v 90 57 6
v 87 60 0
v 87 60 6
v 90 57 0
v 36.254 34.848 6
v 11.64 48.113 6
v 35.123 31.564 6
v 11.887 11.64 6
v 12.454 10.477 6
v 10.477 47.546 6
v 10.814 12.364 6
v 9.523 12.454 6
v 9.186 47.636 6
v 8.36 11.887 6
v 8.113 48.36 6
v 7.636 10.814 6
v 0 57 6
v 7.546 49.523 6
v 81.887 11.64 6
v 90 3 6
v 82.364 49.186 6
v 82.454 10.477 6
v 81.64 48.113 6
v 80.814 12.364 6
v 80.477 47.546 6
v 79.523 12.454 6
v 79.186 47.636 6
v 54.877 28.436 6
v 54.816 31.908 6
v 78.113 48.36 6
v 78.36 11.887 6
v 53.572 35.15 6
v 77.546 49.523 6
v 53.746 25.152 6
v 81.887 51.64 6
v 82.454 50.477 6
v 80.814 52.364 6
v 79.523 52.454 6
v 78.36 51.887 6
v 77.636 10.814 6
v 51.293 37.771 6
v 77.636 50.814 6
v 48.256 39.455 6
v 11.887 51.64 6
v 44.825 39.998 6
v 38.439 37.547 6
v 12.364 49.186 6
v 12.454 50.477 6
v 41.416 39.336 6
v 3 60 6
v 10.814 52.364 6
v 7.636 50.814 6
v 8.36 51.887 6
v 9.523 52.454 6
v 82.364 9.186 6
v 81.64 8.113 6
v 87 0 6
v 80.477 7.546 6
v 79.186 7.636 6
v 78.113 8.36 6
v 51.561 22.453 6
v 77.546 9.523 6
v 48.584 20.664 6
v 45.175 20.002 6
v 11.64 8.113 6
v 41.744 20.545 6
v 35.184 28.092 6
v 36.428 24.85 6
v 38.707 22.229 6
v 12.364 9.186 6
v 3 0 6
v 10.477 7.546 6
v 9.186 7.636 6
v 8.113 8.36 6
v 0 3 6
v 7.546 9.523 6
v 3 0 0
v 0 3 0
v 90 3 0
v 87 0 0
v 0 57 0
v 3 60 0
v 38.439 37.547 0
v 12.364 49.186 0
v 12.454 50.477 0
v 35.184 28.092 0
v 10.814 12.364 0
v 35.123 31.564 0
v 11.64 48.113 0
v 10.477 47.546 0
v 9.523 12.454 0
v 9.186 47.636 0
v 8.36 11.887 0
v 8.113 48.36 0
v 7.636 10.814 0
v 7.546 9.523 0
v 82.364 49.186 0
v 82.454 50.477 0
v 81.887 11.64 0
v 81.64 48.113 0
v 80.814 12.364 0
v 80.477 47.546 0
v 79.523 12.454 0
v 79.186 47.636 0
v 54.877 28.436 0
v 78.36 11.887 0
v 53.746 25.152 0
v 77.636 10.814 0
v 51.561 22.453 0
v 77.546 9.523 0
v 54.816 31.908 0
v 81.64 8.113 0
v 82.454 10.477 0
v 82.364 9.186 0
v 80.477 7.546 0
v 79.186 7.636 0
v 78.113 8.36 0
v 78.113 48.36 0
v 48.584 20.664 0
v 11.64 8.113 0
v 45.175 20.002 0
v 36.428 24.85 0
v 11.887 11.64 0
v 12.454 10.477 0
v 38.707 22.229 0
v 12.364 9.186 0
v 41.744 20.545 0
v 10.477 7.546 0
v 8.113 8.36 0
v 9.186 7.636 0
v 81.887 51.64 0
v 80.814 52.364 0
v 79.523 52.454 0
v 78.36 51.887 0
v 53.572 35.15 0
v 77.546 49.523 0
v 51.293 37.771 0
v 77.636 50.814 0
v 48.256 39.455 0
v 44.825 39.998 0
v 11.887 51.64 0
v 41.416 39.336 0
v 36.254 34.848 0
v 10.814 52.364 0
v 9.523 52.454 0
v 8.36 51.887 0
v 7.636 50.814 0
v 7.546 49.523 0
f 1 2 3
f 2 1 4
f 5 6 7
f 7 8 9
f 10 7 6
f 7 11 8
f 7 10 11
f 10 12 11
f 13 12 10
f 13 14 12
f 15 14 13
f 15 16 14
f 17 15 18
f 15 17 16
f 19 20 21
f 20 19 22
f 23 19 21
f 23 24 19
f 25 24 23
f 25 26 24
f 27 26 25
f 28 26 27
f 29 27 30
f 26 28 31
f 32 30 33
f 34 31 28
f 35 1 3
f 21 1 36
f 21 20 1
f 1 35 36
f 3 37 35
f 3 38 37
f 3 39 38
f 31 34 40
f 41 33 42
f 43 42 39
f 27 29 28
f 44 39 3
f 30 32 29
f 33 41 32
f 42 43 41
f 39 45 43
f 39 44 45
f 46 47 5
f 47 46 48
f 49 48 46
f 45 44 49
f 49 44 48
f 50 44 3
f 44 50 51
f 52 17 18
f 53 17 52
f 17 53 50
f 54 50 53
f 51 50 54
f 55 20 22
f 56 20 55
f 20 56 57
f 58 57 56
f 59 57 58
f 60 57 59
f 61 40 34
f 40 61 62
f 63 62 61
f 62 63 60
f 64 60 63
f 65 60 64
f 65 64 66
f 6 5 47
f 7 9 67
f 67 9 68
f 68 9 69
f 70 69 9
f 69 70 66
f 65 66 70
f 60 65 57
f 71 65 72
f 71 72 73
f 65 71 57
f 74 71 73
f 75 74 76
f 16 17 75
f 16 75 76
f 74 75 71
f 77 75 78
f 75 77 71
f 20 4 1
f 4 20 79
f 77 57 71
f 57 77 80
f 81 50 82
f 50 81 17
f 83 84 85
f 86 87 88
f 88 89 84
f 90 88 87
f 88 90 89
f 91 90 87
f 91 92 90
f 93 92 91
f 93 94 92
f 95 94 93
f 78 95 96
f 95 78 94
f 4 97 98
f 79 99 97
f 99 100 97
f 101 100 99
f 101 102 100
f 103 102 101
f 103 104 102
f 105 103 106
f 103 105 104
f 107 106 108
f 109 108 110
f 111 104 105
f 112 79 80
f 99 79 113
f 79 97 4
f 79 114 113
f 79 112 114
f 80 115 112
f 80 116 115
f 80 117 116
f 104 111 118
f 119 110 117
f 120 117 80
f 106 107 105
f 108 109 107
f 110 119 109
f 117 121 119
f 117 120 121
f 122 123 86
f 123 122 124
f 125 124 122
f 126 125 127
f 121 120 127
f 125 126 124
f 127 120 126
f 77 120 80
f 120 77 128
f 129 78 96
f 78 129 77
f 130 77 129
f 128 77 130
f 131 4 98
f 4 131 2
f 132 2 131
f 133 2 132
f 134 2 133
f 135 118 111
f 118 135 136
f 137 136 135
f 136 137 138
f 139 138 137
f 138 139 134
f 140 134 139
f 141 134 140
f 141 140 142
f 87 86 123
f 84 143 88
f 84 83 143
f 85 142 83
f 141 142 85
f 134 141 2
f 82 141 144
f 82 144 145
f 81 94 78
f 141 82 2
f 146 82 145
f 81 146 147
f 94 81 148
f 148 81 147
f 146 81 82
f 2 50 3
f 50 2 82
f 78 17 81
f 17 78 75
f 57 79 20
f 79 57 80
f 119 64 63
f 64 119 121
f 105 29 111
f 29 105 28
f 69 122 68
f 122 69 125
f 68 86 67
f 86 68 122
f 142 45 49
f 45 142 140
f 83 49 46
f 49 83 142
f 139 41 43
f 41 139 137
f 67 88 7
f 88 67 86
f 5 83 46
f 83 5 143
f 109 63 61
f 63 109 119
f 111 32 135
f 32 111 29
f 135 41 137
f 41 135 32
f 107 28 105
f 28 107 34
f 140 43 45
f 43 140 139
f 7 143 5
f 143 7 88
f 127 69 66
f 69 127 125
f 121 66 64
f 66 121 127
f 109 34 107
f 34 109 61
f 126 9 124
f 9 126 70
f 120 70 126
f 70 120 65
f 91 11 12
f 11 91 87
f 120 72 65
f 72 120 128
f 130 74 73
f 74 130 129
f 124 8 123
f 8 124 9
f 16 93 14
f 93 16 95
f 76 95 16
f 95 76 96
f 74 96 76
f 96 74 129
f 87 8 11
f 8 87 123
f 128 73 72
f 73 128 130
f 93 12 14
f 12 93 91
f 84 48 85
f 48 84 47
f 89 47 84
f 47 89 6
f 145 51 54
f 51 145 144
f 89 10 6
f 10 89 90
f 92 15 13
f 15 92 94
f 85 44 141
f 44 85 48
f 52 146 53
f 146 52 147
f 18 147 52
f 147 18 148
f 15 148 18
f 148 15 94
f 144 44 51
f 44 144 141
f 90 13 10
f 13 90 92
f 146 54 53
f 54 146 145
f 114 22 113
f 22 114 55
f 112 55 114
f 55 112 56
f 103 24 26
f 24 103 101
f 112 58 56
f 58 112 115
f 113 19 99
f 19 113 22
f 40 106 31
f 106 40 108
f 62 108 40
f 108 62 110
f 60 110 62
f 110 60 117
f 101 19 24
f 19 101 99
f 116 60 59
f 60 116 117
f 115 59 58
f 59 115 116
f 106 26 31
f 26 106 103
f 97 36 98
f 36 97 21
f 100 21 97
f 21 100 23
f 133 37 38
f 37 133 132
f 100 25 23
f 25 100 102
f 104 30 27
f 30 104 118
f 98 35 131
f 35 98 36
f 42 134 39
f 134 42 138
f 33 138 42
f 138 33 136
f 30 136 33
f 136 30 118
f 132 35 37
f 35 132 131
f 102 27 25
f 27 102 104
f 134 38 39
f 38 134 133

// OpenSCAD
$fn = 32;

// ----------------------------------------------------------------------
// Spacer plate: rect 90 x 60
// ----------------------------------------------------------------------

// --- parameters (mm) ---
bore_r = 10;              // centre bore radius
bolt_r = 2.5;             // bolt hole radius
plate_t = 6;              // plate thickness, Z (extrusion height)
plate_l = 90;             // plate length, X
plate_w = 60;             // plate width, Y
inset = 10;               // corner hole inset

profile = [[3, 0], [87, 0], [90, 3], [90, 57], [87, 60], [3, 60], [0, 57], [0, 3]];  // primary outline, 8 points, counter clockwise
void_1 = [[54.816, 31.908], [53.572, 35.15], [51.293, 37.771], [48.256, 39.455], [44.825, 39.998], [41.416, 39.336], [38.439, 37.547], [36.254, 34.848], [35.123, 31.564], [35.184, 28.092], [36.428, 24.85], [38.707, 22.229], [41.744, 20.545], [45.175, 20.002], [48.584, 20.664], [51.561, 22.453], [53.746, 25.152], [54.877, 28.436]];  // centre bore, 18 points
void_2 = [[12.454, 10.477], [11.887, 11.64], [10.814, 12.364], [9.523, 12.454], [8.36, 11.887], [7.636, 10.814], [7.546, 9.523], [8.113, 8.36], [9.186, 7.636], [10.477, 7.546], [11.64, 8.113], [12.364, 9.186]];  // corner hole, 12 points
void_3 = [[12.454, 50.477], [11.887, 51.64], [10.814, 52.364], [9.523, 52.454], [8.36, 51.887], [7.636, 50.814], [7.546, 49.523], [8.113, 48.36], [9.186, 47.636], [10.477, 47.546], [11.64, 48.113], [12.364, 49.186]];  // corner hole, 12 points
void_4 = [[82.454, 10.477], [81.887, 11.64], [80.814, 12.364], [79.523, 12.454], [78.36, 11.887], [77.636, 10.814], [77.546, 9.523], [78.113, 8.36], [79.186, 7.636], [80.477, 7.546], [81.64, 8.113], [82.364, 9.186]];  // corner hole, 12 points
void_5 = [[82.454, 50.477], [81.887, 51.64], [80.814, 52.364], [79.523, 52.454], [78.36, 51.887], [77.636, 50.814], [77.546, 49.523], [78.113, 48.36], [79.186, 47.636], [80.477, 47.546], [81.64, 48.113], [82.364, 49.186]];  // corner hole, 12 points

// --- the one profile operation ---
difference() {
  linear_extrude(height = plate_t) polygon(points = profile);
  translate([0, 0, -1])
    linear_extrude(height = plate_t + 2) polygon(points = void_1);
  translate([0, 0, -1])
    linear_extrude(height = plate_t + 2) polygon(points = void_2);
  translate([0, 0, -1])
    linear_extrude(height = plate_t + 2) polygon(points = void_3);
  translate([0, 0, -1])
    linear_extrude(height = plate_t + 2) polygon(points = void_4);
  translate([0, 0, -1])
    linear_extrude(height = plate_t + 2) polygon(points = void_5);
}
